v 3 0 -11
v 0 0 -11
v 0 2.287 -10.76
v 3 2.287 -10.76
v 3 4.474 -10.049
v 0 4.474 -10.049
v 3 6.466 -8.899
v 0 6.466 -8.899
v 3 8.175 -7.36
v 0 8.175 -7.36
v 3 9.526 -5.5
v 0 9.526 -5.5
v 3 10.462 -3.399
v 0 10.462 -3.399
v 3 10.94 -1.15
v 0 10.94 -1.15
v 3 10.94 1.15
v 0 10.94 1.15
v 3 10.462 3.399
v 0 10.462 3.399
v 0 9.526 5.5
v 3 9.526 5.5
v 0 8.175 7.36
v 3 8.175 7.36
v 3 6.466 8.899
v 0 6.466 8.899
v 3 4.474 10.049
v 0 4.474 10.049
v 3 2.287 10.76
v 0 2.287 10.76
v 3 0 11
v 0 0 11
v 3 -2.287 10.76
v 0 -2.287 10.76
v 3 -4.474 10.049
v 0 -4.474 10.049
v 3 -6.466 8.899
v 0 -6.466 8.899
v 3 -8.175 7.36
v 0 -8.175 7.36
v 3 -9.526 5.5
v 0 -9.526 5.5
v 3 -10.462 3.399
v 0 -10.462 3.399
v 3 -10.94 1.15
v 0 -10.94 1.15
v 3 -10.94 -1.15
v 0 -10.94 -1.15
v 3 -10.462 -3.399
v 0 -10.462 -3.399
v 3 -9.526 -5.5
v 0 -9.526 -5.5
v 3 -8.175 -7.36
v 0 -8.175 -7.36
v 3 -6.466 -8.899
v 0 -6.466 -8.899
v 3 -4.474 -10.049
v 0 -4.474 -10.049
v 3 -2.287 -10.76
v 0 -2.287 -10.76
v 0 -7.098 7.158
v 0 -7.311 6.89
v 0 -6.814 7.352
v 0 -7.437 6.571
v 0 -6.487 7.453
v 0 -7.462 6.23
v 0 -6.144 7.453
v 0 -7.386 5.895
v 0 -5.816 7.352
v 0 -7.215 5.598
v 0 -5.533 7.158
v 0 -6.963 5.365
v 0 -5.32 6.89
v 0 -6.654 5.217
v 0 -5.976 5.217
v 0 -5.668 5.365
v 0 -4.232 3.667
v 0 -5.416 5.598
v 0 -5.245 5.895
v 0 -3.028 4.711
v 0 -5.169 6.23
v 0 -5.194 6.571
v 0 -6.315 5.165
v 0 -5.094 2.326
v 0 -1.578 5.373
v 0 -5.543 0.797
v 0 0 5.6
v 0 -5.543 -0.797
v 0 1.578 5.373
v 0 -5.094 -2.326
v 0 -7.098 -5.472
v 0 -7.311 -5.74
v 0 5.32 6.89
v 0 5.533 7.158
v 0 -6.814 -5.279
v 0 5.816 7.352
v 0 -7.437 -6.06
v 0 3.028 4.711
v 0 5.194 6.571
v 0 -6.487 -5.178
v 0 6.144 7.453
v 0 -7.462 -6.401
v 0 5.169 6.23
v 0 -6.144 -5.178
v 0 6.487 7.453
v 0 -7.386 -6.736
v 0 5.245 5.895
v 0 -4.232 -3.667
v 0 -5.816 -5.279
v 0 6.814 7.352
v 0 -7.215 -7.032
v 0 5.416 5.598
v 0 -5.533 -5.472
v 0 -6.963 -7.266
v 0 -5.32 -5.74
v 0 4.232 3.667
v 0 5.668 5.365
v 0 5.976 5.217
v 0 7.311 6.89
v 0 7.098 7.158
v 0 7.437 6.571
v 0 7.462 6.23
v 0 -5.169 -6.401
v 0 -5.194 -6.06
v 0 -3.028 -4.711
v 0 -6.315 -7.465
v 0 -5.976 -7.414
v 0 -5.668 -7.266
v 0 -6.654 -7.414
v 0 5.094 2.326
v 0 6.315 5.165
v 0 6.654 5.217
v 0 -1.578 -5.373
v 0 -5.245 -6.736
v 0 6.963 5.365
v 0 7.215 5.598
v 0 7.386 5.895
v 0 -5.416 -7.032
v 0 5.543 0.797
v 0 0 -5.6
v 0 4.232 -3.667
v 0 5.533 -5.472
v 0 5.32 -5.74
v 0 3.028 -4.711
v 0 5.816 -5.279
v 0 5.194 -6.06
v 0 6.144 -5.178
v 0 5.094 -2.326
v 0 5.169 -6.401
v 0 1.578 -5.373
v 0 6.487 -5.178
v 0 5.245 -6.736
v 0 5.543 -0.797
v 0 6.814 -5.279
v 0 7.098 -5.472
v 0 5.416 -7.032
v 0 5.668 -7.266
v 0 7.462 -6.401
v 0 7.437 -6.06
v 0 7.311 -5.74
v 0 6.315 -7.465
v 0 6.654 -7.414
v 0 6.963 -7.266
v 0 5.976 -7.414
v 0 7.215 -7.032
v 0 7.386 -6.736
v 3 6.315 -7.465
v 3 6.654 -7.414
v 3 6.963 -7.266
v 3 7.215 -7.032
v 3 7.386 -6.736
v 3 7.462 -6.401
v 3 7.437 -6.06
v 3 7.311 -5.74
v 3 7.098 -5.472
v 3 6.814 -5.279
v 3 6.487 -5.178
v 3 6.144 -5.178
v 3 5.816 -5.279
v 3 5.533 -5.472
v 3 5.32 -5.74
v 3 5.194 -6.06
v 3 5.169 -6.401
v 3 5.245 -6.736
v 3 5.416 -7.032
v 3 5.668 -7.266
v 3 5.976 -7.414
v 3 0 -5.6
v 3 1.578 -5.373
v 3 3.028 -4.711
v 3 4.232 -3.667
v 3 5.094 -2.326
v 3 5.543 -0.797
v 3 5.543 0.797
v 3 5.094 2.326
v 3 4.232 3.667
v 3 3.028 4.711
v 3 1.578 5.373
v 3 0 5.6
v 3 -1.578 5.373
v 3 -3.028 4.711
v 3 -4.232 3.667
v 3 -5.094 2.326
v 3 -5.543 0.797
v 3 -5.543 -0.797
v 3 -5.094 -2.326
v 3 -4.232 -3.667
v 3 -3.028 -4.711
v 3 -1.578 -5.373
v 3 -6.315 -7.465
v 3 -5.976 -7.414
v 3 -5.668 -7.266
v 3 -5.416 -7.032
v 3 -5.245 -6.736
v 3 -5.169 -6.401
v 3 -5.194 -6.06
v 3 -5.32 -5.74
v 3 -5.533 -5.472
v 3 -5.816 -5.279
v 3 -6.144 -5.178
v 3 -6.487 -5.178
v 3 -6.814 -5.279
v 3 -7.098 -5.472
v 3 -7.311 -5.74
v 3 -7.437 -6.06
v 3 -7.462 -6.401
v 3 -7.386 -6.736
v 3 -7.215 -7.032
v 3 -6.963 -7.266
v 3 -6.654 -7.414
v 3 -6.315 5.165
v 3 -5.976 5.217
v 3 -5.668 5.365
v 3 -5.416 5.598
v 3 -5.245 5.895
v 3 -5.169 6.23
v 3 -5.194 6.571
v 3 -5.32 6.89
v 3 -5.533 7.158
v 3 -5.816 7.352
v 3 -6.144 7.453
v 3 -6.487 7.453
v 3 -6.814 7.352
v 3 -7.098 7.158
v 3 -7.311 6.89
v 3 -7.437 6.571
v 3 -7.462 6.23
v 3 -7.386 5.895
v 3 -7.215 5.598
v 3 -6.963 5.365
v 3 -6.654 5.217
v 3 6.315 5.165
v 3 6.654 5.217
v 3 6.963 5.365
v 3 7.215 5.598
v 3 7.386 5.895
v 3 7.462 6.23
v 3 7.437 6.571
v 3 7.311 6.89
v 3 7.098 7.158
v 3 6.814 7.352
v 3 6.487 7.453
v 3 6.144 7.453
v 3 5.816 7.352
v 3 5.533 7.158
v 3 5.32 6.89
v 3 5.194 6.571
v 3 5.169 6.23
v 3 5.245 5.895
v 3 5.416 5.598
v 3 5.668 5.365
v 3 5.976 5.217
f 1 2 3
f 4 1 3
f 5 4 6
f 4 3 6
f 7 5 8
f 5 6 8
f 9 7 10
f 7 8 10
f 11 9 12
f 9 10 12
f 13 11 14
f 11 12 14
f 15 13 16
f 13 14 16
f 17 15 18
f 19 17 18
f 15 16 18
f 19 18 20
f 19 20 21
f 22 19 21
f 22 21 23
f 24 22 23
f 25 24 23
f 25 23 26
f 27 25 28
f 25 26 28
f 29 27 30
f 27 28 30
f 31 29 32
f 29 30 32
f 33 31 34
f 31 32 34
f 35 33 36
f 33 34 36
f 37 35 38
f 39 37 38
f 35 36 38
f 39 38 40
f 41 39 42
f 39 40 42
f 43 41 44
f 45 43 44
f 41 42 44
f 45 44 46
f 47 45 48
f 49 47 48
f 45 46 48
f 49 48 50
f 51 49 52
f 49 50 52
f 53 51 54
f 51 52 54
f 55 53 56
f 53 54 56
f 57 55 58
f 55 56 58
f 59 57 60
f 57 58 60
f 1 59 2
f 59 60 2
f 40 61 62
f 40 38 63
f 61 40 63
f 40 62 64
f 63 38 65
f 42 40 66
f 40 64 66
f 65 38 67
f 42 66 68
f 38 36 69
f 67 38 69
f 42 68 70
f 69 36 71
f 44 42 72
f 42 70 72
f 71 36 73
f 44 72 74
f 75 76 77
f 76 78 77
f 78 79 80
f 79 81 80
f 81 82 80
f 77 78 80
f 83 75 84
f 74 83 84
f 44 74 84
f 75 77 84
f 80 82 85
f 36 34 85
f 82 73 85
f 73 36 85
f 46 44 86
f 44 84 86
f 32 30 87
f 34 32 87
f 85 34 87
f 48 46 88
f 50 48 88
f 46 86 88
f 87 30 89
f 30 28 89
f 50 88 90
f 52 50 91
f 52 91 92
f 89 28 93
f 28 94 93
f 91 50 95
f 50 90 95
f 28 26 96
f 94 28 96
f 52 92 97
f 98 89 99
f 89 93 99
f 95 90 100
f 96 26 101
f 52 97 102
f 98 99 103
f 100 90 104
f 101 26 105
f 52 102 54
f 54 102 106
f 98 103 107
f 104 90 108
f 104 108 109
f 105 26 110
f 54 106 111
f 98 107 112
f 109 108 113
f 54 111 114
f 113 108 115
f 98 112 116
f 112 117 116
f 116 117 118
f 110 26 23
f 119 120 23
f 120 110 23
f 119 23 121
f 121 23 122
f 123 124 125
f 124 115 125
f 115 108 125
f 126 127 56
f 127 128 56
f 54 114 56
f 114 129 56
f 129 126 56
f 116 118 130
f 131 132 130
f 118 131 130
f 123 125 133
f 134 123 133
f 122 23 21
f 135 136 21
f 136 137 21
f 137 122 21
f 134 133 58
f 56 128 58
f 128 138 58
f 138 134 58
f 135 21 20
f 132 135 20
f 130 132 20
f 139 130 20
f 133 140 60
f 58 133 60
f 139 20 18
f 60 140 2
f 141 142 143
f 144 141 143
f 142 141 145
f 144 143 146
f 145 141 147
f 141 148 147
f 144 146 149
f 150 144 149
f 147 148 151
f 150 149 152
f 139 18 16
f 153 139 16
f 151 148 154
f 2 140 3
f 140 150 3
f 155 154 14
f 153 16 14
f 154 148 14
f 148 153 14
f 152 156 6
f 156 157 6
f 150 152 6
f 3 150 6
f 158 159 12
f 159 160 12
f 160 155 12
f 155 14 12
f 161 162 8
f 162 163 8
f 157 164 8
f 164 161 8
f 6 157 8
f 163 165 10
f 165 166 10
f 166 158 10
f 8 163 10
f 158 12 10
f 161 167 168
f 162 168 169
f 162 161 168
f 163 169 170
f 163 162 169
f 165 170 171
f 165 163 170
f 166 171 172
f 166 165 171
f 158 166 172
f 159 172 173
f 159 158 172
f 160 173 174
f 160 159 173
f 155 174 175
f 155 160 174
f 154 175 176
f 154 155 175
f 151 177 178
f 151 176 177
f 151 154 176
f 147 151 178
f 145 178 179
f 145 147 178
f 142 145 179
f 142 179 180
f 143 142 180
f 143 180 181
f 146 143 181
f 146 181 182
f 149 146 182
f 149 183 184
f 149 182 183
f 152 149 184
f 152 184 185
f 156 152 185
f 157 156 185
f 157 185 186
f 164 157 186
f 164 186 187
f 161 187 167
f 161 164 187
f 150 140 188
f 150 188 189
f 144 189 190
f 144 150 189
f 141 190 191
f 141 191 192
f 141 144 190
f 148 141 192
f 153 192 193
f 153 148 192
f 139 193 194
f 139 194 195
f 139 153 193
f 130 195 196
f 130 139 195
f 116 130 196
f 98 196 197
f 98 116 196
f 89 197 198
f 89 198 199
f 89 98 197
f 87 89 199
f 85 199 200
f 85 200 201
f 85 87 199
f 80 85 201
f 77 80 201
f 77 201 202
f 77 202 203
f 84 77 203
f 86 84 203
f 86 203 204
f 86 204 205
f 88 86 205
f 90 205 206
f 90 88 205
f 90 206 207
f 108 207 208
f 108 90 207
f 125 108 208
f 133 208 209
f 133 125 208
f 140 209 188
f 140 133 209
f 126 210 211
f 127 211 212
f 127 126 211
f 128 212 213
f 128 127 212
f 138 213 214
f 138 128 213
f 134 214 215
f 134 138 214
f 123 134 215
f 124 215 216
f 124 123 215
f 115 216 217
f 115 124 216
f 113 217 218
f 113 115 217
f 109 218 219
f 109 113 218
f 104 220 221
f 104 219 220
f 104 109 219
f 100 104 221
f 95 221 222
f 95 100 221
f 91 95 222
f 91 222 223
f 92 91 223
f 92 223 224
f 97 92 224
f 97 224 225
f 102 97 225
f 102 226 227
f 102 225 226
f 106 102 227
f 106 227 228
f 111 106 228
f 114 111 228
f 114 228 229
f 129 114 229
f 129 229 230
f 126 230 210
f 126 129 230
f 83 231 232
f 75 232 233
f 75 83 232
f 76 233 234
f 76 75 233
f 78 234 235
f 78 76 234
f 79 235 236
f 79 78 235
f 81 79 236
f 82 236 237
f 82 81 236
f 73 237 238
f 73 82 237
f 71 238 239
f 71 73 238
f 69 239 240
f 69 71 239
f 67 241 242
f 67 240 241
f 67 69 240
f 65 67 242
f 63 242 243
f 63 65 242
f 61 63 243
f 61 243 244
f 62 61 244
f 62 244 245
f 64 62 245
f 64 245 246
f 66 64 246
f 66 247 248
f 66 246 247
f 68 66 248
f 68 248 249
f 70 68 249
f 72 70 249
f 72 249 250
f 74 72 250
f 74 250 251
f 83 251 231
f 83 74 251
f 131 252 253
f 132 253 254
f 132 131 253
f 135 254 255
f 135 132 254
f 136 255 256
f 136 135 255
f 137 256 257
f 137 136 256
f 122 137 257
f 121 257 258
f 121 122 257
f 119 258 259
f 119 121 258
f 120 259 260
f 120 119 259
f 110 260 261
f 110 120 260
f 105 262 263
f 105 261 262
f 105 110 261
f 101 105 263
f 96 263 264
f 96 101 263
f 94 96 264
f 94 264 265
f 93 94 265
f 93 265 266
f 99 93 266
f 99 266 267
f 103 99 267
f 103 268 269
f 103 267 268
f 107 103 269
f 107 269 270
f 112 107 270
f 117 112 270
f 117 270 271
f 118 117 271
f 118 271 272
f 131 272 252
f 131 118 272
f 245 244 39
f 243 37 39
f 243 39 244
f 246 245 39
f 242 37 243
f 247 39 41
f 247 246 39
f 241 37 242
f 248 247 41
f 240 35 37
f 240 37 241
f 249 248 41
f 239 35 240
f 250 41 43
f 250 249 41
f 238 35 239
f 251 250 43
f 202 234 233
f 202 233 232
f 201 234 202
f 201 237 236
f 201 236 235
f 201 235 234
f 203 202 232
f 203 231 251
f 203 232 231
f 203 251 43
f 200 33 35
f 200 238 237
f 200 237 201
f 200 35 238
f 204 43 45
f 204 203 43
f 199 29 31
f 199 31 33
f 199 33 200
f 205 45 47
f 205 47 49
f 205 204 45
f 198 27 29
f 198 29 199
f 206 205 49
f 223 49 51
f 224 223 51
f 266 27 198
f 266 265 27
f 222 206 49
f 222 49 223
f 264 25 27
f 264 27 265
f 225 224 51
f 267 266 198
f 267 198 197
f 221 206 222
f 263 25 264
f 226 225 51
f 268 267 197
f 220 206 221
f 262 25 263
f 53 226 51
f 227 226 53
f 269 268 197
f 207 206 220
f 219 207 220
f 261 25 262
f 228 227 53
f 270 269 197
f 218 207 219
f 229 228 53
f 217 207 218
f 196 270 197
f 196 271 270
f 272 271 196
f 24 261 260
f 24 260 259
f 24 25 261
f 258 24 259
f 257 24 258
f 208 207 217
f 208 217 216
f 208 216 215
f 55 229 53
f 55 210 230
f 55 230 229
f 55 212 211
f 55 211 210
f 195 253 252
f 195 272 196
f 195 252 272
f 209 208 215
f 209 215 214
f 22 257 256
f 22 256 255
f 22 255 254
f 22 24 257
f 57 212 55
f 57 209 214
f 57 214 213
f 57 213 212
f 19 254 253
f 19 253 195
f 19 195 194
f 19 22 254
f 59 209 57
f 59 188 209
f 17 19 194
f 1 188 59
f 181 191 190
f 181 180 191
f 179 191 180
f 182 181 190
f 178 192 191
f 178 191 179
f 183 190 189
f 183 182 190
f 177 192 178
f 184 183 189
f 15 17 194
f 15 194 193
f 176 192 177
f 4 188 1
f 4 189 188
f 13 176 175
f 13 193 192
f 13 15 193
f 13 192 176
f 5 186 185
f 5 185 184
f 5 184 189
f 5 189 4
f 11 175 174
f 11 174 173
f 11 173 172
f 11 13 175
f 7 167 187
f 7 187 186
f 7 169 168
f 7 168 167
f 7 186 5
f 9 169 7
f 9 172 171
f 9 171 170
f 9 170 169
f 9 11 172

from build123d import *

# Parameters (mm, degrees)
SKETCH2_R           = 11
SKETCH2_R_2         = 5.6
BOSS_EXTRUDE1_DEPTH = 3
SKETCH3_R           = 1.15
CUT_EXTRUDE1_DEPTH  = 4


with BuildPart() as part:
    # Sketch2 → Boss-Extrude1 (new body)
    with BuildSketch(Plane(origin=(0, 0, 0), x_dir=(0, 0, -1), z_dir=(1, 0, 0))):
        Circle(SKETCH2_R)
        Circle(SKETCH2_R_2, mode=Mode.SUBTRACT)
    extrude(amount=BOSS_EXTRUDE1_DEPTH)

    # Sketch3 → Cut-Extrude1 (cut, through all)
    with BuildSketch(Plane(origin=(0, 0, 0), x_dir=(0, 0, -1), z_dir=(1, 0, 0))):
        with Locations((6.315465173, 6.315465173)):
            Circle(SKETCH3_R)
        with Locations((6.315465173, -6.315465173)):
            Circle(SKETCH3_R)
        with Locations((-6.315465173, -6.315465173)):
            Circle(SKETCH3_R)
        with Locations((-6.315465173, 6.315465173)):
            Circle(SKETCH3_R)
    extrude(amount=CUT_EXTRUDE1_DEPTH, mode=Mode.SUBTRACT)


solid = part.part
